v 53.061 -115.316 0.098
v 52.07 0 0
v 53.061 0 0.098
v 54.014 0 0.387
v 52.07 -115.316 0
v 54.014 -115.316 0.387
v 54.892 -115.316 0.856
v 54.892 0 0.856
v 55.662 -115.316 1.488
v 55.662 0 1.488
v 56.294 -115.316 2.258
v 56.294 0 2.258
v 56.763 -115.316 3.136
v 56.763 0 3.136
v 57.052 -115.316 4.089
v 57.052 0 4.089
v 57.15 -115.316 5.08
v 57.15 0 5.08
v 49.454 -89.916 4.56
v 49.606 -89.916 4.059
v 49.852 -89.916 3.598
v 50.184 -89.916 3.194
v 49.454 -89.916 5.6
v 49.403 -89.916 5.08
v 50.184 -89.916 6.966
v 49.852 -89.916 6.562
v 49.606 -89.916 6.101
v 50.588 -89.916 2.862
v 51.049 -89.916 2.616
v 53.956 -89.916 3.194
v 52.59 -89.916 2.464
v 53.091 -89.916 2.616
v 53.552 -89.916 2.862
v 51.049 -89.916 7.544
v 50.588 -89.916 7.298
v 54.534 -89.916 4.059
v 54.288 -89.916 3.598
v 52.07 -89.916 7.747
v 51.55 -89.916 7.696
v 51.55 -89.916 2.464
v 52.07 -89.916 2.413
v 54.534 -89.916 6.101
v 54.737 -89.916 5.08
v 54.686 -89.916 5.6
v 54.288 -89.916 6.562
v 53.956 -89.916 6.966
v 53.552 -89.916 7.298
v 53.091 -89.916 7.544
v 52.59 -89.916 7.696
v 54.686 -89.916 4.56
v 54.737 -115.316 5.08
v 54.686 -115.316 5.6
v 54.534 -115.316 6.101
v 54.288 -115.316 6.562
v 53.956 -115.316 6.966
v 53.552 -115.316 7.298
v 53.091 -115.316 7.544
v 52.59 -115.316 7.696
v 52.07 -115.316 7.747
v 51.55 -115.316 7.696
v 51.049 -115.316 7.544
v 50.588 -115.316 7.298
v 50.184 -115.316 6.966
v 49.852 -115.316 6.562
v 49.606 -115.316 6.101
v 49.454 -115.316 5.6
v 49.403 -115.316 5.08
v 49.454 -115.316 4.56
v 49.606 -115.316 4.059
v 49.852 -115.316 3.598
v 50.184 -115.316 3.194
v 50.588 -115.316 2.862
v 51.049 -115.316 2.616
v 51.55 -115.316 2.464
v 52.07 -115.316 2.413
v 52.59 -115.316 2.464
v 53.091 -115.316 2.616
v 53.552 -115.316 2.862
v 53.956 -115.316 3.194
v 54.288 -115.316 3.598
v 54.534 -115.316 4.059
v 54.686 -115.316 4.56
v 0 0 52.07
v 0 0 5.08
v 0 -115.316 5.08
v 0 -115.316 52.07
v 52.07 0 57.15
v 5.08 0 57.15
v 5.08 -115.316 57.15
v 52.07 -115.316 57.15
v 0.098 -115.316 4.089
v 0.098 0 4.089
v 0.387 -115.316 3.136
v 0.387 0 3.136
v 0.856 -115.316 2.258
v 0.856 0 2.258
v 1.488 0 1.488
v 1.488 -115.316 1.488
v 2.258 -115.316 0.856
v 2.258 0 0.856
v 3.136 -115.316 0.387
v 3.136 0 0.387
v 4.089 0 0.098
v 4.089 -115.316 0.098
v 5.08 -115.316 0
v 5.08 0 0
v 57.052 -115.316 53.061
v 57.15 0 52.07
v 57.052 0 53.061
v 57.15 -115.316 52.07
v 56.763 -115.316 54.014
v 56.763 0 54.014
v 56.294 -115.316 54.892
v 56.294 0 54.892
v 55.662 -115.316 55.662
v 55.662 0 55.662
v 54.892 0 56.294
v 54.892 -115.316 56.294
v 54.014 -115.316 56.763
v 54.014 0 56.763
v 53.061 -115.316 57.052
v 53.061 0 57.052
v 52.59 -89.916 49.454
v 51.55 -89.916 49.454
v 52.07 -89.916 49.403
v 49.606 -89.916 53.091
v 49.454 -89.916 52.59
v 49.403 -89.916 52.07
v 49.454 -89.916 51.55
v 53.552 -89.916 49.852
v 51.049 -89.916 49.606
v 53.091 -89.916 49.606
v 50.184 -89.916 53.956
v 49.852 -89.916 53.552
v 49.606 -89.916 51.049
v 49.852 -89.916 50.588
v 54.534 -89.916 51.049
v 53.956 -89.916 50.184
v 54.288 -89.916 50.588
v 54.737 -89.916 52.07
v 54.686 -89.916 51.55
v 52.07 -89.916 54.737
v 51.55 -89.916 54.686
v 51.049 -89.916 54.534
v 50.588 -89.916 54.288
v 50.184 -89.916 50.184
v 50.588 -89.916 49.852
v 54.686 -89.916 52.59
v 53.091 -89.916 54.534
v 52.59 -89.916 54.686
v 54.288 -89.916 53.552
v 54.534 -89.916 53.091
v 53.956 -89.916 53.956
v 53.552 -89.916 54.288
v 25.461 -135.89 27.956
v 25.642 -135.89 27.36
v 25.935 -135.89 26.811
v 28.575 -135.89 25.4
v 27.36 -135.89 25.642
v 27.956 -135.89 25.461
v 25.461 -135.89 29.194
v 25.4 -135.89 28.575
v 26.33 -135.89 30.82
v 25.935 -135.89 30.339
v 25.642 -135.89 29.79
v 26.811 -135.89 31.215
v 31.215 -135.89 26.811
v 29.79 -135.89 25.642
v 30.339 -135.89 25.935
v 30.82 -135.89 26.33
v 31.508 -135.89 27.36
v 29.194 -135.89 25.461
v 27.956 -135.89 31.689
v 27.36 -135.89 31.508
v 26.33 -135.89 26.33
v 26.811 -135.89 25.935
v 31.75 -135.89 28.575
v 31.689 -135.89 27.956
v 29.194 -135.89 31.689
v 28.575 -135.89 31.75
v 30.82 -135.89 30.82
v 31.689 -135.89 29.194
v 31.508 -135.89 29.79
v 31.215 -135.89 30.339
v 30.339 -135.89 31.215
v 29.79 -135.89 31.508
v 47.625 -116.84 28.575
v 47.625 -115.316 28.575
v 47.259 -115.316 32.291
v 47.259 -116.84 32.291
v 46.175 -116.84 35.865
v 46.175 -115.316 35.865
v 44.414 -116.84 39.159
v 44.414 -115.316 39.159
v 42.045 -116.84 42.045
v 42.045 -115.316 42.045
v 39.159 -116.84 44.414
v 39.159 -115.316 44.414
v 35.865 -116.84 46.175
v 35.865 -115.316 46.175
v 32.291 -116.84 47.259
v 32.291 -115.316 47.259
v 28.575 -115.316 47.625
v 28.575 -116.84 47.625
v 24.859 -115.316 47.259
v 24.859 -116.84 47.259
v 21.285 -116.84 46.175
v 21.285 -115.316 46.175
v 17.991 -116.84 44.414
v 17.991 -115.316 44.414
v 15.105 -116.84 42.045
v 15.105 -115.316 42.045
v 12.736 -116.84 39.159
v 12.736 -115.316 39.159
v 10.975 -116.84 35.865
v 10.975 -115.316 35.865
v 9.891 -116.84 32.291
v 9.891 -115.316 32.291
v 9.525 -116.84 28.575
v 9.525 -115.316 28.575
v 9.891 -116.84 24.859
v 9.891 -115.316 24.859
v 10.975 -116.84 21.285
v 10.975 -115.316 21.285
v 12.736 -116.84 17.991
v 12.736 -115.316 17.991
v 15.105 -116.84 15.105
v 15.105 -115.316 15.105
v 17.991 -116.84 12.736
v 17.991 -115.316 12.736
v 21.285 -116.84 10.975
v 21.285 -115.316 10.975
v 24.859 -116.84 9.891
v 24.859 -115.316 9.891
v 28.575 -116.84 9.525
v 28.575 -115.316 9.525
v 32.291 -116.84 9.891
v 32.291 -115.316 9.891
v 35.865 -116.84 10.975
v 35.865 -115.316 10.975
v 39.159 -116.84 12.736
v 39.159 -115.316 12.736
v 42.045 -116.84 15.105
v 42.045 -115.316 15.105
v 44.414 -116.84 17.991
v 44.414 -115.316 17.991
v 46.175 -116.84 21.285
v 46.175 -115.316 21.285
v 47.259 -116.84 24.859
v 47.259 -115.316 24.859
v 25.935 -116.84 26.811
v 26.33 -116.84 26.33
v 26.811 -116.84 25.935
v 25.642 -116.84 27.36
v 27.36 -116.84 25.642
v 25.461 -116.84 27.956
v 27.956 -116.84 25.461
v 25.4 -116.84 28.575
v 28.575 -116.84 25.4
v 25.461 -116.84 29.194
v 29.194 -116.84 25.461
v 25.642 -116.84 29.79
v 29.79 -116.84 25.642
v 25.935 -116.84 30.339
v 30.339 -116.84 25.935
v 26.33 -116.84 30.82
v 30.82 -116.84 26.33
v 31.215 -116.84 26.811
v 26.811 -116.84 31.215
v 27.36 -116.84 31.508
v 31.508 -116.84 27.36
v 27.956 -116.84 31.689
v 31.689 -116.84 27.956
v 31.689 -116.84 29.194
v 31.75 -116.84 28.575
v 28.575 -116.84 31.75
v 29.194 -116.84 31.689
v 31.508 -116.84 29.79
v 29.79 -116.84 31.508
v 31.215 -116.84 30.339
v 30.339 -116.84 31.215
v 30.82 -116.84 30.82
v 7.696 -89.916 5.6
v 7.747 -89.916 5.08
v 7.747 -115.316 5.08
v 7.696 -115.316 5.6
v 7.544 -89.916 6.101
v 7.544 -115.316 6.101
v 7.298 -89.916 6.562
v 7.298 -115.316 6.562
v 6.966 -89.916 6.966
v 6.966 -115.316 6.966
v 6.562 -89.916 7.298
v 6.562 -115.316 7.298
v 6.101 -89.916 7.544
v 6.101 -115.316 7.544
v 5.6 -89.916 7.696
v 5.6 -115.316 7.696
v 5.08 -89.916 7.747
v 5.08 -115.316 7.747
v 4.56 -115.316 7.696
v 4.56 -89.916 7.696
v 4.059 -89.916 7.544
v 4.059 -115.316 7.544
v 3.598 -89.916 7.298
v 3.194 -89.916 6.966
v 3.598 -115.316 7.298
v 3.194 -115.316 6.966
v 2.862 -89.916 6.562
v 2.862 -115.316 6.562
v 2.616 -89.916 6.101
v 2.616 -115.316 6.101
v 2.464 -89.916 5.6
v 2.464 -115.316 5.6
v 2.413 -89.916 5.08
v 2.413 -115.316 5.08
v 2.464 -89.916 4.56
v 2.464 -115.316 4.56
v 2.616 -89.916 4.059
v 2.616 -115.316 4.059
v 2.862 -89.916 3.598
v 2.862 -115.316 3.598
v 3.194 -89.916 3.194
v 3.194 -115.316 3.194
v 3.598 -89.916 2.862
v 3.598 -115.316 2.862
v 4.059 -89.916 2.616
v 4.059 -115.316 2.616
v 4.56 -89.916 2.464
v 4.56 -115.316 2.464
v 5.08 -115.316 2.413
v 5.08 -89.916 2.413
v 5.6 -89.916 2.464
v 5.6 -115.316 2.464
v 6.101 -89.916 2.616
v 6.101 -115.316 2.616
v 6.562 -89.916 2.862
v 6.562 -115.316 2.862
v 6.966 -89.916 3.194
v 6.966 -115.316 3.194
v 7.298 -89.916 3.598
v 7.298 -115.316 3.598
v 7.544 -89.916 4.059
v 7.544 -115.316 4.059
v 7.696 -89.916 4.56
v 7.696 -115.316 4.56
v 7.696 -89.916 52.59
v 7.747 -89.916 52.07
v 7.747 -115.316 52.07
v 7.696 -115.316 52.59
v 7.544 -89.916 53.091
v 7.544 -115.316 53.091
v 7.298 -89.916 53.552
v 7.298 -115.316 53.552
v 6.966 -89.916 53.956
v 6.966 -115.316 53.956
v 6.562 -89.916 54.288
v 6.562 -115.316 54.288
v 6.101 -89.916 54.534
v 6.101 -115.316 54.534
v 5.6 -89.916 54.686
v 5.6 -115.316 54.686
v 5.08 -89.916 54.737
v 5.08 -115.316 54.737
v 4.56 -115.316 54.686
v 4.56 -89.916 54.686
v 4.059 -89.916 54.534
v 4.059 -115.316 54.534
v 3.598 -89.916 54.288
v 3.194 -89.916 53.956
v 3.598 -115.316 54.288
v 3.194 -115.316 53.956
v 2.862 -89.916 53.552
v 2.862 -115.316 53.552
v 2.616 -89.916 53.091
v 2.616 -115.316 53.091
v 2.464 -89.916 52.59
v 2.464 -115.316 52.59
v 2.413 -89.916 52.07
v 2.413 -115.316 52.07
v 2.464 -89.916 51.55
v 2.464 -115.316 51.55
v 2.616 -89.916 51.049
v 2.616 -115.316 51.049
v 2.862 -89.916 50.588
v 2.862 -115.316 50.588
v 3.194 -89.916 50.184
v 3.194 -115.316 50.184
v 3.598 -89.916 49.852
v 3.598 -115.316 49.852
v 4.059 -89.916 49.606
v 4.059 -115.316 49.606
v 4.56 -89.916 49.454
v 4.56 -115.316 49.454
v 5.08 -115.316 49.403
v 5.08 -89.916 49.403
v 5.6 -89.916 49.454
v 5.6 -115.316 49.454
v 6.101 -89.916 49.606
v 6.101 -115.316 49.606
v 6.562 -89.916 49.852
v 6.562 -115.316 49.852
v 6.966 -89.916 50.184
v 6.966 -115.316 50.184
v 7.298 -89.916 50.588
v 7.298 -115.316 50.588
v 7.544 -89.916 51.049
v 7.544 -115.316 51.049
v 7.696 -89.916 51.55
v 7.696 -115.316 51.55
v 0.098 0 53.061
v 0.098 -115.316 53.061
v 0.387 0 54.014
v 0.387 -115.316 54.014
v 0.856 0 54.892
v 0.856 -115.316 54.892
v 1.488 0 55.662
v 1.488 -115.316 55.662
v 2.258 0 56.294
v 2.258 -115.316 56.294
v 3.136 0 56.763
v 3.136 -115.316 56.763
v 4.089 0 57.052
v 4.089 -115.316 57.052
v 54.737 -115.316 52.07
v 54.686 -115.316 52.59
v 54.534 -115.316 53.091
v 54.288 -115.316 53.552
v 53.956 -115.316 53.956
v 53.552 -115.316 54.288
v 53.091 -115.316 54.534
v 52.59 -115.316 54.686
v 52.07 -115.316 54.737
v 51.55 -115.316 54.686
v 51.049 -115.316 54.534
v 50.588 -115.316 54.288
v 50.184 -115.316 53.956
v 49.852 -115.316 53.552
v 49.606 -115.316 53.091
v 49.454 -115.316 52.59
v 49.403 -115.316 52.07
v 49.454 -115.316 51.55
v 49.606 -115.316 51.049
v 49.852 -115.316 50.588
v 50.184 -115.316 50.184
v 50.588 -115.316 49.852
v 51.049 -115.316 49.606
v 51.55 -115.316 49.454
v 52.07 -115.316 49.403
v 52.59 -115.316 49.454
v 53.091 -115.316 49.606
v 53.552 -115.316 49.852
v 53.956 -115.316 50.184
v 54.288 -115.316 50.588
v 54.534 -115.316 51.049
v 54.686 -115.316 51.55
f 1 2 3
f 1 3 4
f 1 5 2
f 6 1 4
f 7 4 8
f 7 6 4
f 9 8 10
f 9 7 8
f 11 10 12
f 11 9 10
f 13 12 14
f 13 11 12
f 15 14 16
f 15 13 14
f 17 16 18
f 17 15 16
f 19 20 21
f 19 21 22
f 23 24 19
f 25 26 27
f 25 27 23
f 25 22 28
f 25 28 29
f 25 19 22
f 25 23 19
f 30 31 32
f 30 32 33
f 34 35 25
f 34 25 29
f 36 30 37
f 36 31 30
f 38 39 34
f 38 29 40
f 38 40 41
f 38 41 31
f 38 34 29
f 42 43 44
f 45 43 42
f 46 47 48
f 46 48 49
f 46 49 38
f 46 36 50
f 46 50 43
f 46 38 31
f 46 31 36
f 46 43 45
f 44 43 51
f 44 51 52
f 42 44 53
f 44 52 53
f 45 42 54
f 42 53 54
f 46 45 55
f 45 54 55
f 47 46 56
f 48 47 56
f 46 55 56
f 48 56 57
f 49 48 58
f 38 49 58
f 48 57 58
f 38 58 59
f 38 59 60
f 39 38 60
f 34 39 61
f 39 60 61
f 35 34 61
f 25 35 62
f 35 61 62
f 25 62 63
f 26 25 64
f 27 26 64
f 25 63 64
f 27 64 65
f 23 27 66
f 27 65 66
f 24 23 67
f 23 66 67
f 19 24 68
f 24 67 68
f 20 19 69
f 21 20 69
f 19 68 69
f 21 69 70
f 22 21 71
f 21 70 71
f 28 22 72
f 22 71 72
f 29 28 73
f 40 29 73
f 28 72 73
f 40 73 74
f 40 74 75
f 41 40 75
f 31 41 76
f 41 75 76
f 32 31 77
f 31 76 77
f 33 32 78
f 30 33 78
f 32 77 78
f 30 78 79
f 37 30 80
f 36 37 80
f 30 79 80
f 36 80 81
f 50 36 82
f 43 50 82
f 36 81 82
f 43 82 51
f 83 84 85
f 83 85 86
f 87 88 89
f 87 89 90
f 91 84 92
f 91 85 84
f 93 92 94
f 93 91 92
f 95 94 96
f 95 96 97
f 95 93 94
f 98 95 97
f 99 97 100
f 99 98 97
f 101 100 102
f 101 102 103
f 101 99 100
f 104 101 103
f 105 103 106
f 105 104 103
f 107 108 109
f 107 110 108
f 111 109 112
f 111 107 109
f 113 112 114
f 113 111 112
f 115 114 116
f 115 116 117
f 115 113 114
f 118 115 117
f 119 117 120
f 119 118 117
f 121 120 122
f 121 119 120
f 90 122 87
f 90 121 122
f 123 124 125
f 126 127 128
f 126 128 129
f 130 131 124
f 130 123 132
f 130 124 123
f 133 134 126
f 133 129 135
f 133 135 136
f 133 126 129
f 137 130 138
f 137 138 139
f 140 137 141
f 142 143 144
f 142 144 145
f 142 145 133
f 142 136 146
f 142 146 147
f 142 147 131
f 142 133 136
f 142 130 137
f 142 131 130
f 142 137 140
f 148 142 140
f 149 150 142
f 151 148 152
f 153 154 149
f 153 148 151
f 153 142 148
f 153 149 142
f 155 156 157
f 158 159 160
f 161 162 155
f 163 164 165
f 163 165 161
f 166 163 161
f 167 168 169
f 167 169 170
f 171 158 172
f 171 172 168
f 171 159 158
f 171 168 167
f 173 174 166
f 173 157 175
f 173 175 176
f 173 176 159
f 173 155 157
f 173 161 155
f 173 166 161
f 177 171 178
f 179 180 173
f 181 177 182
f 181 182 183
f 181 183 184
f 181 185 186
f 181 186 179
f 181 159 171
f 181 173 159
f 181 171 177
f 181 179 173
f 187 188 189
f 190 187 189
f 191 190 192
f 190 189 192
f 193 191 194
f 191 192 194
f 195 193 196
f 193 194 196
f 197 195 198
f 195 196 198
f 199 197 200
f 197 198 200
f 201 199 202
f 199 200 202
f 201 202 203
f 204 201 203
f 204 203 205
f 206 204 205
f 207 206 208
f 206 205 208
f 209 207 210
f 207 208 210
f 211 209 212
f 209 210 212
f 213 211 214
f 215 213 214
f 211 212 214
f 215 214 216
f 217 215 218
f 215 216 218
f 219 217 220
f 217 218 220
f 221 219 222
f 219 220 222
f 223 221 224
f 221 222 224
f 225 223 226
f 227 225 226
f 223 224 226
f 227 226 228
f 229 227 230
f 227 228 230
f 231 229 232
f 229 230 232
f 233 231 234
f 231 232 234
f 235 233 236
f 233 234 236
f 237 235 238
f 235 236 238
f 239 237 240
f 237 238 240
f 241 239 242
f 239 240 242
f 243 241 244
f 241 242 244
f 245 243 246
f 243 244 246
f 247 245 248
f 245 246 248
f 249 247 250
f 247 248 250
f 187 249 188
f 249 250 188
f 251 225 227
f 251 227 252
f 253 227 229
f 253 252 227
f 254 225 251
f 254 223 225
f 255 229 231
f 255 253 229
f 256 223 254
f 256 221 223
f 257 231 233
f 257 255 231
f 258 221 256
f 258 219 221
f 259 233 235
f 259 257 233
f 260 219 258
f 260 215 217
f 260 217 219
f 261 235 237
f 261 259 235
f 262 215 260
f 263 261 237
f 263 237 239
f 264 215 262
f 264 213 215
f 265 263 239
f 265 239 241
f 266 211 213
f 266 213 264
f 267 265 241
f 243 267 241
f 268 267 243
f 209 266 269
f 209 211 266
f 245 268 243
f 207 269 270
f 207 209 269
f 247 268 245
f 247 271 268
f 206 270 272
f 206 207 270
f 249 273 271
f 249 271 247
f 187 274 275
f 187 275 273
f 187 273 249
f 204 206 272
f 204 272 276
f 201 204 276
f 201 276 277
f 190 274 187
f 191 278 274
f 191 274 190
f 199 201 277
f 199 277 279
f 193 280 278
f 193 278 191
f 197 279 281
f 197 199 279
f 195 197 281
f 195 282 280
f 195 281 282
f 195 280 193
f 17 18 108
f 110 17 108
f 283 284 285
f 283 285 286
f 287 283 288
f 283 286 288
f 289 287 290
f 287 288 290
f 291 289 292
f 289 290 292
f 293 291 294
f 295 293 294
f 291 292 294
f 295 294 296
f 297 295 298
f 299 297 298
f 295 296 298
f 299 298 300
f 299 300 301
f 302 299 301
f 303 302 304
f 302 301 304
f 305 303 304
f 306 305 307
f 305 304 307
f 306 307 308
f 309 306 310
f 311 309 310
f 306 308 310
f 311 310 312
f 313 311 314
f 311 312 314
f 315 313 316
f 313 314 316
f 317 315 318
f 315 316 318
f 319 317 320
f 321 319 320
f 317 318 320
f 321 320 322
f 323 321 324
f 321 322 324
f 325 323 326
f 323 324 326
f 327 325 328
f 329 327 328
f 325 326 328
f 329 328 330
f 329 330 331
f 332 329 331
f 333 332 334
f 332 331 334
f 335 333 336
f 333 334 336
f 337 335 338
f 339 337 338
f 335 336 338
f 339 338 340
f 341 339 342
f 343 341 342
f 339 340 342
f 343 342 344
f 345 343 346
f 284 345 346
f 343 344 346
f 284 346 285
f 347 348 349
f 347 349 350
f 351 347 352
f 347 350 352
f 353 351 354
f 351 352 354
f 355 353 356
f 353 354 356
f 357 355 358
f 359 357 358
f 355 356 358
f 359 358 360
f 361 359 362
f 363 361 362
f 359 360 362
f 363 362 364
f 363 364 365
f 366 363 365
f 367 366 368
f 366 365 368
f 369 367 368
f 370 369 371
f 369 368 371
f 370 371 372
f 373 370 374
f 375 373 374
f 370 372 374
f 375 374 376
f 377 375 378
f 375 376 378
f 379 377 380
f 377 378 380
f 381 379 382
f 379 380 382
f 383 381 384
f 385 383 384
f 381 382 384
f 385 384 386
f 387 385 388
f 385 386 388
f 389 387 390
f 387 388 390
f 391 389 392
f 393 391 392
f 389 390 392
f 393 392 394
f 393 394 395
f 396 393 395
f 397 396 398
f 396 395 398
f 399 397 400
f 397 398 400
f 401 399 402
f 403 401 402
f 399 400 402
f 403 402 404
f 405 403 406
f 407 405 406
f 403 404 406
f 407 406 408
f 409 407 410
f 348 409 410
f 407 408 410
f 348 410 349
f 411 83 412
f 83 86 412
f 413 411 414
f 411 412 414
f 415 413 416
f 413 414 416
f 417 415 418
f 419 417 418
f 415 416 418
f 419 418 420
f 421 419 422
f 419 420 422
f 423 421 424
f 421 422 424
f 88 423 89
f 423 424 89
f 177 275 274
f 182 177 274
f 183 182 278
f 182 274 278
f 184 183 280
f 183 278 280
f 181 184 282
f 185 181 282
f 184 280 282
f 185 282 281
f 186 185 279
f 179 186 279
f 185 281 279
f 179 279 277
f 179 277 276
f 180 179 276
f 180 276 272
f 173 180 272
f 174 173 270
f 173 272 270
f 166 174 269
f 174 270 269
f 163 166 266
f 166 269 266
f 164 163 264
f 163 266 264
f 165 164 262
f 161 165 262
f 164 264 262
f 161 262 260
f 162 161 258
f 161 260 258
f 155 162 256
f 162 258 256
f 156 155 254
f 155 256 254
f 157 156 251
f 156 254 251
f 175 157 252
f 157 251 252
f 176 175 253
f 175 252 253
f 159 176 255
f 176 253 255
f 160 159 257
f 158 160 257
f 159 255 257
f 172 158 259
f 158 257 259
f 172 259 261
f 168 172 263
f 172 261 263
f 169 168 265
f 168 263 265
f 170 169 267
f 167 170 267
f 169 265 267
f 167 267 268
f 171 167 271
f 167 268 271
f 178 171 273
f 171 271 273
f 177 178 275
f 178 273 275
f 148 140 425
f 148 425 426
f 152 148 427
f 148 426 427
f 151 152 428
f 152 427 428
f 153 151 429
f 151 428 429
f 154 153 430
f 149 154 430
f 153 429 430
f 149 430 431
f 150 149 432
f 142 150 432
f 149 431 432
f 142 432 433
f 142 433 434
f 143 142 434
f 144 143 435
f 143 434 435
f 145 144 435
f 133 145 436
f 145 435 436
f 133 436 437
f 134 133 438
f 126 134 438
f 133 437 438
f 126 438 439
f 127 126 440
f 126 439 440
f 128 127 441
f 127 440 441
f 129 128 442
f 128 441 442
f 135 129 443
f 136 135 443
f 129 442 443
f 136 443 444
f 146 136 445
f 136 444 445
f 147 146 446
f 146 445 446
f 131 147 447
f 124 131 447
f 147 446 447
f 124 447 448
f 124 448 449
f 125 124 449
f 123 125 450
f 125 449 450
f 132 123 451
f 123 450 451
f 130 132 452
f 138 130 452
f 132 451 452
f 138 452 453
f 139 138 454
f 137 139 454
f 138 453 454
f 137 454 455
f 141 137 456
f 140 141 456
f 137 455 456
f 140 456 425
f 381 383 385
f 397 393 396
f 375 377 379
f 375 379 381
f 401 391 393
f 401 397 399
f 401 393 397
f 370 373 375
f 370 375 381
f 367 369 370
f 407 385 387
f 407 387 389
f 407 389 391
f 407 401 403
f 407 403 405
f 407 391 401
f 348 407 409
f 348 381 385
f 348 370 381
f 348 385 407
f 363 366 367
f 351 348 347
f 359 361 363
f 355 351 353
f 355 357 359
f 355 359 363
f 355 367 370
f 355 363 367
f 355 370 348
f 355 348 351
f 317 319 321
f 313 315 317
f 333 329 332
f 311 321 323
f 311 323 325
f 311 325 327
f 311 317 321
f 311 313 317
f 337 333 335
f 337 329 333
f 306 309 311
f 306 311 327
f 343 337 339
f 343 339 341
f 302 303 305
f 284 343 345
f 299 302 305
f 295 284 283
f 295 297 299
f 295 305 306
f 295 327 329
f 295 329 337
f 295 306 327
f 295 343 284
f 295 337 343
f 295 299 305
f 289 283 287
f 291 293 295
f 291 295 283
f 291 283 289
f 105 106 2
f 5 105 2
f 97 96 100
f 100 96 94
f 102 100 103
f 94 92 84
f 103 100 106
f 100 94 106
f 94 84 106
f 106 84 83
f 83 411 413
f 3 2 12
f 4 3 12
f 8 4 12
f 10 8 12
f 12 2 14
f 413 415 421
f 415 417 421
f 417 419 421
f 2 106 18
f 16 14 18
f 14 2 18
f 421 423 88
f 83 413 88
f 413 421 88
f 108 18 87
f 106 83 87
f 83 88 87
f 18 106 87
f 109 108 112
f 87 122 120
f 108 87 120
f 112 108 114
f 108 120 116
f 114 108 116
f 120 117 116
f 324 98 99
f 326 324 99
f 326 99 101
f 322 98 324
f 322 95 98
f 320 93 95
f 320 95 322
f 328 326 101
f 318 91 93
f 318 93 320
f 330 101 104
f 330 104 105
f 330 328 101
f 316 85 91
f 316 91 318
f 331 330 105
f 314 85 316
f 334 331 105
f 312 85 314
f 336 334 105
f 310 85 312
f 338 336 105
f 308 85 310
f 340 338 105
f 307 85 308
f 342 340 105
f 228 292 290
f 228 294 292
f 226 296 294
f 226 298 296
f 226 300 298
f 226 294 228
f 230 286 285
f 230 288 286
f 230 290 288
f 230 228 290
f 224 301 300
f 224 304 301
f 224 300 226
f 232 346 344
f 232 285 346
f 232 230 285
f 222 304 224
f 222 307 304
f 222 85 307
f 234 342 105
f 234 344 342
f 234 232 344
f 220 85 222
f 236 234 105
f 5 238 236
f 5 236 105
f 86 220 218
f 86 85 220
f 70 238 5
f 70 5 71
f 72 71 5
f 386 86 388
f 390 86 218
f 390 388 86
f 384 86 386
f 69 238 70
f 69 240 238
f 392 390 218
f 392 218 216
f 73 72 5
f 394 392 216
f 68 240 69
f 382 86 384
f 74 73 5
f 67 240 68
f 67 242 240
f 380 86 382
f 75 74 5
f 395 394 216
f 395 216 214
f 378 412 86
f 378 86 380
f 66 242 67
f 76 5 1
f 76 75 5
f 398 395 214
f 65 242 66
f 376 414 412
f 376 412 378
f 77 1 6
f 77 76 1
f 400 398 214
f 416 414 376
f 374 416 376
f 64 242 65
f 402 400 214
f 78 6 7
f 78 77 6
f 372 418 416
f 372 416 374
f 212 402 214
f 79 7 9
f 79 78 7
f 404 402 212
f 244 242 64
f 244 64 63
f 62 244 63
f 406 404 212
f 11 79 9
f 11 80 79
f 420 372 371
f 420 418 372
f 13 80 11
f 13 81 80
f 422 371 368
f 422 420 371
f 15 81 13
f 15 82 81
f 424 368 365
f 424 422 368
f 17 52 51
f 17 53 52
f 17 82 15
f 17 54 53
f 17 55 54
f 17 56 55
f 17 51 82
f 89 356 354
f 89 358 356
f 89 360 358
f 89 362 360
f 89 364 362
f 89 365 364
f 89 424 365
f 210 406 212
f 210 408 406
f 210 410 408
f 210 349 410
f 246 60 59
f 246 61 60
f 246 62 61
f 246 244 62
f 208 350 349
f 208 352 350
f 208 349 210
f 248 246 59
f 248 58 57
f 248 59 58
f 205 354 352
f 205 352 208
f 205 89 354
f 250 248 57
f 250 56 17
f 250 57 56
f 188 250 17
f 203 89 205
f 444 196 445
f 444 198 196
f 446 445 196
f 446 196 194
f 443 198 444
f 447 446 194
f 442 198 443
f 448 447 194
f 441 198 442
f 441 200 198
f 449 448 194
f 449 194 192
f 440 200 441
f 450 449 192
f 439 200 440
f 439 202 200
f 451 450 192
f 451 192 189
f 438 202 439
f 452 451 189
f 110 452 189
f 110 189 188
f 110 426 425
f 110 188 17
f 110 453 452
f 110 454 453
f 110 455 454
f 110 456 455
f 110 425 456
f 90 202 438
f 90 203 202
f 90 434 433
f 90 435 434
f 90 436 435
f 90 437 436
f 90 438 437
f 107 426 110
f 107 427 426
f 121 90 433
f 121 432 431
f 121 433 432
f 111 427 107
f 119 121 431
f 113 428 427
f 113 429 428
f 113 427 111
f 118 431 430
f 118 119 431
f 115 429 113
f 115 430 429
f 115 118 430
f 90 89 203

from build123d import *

# Parameters (mm, degrees)
F0_W     = 57.15
F0_H     = 57.15
F1_DEPTH = 115.316
F2_R     = 5.08
F3_R     = 19.05
F4_DEPTH = 1.524
F5_R     = 3.175
F6_DEPTH = 19.05
F7_R     = 2.667
F8_DEPTH = 25.4


with BuildPart() as f1:
    # F0 (on Front) → F1 (new body)
    with BuildSketch(Plane.XZ):
        with Locations((28.575, 28.575)):
            Rectangle(F0_W, F0_H)
    extrude(amount=F1_DEPTH)

    # F2
    f2_edges = [f1.edges().sort_by_distance(p)[0] for p in [
        (57.15, -57.658, 57.15),
        (57.15, -57.658, 0),
        (0, -57.658, 0),
        (0, -57.658, 57.15),
    ]]
    fillet(f2_edges, radius=F2_R)

    # F3 (on face) → F4 (join)
    with BuildSketch(Plane.XZ.offset(115.316)):
        with Locations((28.575, 28.575)):
            Circle(F3_R)
    extrude(amount=F4_DEPTH)

    # F5 (on face) → F6 (join)
    with BuildSketch(Plane.XZ.offset(116.84)):
        with Locations((28.575, 28.575)):
            Circle(F5_R)
    extrude(amount=F6_DEPTH)

    # F7 (on face) → F8 (cut)
    with BuildSketch(Plane.XZ.offset(115.316)):
        with Locations((52.07, 52.07)):
            Circle(F7_R)
        with Locations((5.08, 52.07)):
            Circle(F7_R)
        with Locations((52.07, 5.08)):
            Circle(F7_R)
        with Locations((5.08, 5.08)):
            Circle(F7_R)
    extrude(amount=-F8_DEPTH, mode=Mode.SUBTRACT)


solid = f1.part
